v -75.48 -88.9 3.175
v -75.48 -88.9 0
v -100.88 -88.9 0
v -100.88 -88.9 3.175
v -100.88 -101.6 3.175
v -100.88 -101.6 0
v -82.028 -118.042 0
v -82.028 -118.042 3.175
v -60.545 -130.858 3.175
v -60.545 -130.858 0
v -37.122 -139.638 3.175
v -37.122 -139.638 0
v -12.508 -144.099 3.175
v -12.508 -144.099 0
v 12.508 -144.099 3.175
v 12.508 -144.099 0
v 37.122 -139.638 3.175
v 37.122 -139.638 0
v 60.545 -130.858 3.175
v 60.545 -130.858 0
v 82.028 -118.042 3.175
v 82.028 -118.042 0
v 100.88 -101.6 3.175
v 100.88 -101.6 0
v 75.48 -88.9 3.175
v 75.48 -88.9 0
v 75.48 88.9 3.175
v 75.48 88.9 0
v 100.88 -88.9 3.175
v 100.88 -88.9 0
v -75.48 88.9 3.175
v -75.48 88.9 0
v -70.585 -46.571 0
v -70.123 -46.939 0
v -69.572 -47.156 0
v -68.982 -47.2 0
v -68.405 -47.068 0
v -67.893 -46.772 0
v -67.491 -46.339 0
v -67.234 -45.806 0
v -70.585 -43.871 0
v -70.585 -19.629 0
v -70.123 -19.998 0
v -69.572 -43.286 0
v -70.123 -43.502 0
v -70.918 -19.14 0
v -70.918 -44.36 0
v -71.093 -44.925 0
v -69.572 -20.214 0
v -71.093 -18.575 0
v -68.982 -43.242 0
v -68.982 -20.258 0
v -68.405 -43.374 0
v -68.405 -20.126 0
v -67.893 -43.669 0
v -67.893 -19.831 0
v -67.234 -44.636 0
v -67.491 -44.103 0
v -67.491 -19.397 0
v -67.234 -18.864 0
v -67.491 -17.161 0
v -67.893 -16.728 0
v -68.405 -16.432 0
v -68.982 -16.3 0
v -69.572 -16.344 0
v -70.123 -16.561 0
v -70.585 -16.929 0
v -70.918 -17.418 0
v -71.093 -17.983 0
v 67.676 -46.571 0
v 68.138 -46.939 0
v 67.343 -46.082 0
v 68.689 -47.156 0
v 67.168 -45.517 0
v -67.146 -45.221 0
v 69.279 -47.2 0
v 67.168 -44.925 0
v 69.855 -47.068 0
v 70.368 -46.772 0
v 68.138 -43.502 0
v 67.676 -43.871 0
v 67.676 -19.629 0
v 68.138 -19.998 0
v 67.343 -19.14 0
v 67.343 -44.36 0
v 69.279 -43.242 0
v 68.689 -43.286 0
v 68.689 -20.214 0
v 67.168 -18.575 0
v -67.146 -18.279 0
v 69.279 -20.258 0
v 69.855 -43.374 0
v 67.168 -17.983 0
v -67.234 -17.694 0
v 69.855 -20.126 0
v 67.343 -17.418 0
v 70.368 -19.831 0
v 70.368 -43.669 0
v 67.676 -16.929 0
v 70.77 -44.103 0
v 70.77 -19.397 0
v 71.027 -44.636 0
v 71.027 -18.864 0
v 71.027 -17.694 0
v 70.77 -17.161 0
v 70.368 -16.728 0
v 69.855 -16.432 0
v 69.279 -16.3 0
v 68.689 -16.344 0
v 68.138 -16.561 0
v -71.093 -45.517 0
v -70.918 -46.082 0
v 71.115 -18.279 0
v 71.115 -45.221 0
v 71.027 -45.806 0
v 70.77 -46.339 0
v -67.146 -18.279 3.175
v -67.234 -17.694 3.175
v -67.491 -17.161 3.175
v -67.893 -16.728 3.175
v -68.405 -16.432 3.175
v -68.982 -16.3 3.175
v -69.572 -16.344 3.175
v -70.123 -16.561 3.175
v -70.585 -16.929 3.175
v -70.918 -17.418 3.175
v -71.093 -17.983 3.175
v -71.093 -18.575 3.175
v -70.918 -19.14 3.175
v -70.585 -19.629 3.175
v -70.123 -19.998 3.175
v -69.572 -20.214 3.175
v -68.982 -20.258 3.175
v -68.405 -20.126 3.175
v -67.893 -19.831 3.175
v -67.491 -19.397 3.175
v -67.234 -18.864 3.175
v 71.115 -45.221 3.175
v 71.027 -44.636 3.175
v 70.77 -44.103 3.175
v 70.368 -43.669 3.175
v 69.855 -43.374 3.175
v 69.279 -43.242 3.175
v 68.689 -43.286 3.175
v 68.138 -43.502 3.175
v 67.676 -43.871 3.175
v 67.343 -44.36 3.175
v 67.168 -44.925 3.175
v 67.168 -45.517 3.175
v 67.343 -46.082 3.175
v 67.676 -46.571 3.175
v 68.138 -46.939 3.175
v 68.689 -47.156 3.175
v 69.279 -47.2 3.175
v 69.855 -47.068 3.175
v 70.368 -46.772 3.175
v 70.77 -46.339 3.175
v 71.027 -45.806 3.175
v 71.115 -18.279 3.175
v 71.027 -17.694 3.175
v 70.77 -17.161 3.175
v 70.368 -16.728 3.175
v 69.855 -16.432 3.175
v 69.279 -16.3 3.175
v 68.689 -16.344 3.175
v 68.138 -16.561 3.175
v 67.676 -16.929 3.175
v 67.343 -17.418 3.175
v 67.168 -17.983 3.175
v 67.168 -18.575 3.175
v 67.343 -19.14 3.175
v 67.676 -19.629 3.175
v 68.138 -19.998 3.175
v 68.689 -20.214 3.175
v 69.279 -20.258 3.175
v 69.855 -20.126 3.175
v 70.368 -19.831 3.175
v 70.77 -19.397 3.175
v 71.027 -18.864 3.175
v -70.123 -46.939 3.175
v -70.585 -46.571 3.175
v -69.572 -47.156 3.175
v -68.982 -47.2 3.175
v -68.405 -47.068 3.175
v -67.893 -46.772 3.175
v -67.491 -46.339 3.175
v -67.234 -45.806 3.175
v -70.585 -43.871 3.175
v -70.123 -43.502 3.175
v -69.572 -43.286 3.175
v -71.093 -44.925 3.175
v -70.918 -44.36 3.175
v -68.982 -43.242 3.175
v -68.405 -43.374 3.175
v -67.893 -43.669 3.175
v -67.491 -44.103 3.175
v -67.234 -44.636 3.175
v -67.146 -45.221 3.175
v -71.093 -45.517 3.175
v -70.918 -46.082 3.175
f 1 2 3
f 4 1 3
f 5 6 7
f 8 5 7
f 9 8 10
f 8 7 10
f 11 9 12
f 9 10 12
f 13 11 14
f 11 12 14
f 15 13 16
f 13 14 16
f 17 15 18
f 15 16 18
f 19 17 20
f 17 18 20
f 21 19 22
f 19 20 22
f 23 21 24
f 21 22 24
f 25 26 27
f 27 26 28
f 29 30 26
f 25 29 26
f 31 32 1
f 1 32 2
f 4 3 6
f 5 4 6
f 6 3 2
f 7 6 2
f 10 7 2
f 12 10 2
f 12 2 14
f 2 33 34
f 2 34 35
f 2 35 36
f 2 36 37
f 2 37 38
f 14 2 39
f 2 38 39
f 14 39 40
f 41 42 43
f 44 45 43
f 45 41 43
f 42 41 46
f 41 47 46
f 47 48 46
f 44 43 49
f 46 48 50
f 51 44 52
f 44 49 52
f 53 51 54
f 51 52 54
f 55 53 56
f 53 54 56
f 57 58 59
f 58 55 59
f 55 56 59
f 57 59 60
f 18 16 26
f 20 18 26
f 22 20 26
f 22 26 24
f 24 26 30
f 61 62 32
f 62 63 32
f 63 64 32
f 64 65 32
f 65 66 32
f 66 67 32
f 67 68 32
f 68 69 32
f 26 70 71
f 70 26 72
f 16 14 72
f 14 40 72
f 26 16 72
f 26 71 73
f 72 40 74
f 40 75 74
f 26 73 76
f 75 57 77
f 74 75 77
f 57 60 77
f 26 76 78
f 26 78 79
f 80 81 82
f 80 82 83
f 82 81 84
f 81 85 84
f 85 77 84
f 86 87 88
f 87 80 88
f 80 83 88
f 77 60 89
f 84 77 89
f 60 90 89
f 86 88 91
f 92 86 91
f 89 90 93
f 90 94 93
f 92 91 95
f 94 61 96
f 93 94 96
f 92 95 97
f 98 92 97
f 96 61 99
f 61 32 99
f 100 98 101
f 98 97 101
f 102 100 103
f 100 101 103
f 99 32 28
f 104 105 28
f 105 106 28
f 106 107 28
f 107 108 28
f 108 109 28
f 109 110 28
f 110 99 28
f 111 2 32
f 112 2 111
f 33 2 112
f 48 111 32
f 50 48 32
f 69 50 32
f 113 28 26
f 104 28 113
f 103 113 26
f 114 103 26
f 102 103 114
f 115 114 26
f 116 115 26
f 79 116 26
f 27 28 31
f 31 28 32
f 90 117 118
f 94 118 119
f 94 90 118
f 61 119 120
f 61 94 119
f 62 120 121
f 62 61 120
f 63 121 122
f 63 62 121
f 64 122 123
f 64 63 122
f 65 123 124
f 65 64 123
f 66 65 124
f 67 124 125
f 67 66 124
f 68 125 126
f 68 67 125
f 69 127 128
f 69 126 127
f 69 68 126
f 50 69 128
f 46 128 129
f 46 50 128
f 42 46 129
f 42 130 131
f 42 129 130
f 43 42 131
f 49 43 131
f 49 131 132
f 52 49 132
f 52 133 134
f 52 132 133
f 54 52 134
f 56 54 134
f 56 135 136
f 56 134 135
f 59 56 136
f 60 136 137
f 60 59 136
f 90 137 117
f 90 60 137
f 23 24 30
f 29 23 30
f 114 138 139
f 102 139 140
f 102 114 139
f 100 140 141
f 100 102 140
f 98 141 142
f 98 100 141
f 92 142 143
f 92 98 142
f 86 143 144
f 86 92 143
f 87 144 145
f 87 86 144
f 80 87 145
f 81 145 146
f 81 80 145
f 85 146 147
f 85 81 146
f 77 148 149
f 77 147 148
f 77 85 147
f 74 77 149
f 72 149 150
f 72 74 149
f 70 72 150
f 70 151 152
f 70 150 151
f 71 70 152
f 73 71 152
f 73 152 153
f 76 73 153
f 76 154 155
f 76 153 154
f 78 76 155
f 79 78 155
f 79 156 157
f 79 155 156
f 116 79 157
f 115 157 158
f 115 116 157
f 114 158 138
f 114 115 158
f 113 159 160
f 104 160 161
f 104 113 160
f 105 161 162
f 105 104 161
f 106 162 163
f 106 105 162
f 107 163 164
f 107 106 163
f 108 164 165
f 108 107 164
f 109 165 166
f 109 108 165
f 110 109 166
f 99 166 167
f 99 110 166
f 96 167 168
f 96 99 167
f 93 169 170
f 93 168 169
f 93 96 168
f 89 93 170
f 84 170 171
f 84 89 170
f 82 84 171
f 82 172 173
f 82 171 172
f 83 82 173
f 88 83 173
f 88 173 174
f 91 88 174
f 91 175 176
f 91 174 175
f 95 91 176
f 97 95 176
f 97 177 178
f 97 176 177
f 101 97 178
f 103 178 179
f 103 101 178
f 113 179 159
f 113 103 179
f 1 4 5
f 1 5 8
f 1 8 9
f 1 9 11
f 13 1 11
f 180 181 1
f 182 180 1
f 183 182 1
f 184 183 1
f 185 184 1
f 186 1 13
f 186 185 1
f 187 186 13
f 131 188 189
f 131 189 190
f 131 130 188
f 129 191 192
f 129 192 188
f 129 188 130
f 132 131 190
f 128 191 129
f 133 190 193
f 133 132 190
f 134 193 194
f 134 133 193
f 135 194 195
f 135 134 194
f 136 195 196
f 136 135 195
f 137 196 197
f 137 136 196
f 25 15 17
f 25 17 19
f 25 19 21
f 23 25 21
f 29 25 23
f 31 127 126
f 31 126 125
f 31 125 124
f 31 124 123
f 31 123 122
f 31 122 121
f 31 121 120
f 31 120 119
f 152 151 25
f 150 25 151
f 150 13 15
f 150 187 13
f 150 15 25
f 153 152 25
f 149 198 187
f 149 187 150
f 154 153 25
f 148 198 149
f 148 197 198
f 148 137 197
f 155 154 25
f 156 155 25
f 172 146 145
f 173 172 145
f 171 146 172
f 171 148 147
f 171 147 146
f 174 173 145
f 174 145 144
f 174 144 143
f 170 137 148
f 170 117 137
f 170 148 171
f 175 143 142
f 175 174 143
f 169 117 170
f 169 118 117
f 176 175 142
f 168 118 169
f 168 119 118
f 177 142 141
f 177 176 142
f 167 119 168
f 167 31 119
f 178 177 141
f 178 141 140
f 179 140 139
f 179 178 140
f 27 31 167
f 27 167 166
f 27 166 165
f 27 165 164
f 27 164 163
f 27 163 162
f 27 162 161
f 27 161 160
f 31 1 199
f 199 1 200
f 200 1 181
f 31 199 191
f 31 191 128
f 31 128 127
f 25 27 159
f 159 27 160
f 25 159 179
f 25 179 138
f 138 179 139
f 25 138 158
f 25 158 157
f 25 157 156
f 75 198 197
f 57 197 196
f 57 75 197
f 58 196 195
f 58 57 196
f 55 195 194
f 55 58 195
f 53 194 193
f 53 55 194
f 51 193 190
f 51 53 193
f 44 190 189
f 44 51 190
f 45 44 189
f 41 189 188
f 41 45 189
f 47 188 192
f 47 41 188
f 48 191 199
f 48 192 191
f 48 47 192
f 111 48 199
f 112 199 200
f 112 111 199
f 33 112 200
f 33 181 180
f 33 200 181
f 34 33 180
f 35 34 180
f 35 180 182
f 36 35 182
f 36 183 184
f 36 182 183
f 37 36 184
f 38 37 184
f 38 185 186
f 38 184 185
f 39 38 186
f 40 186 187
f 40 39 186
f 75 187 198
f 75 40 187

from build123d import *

# Parameters (mm, degrees)
F1_DEPTH = 3.175
F2_R     = 1.984375
F3_DEPTH = 3.176


with BuildPart() as f1:
    # F0 (on Top) → F1 (new body)
    with BuildSketch(Plane.XY):
        with BuildLine():
            Line((75.480408, 88.9), (-75.480408, 88.9))
            Line((-75.480408, 88.9), (-75.480408, -88.9))
            Line((-75.480408, -88.9), (-100.880408, -88.9))
            Line((-100.880408, -88.9), (-100.880408, -101.6))
            ThreePointArc((-100.880408, -101.6), (0, -144.660291), (100.880408, -101.6))
            Line((100.880408, -101.6), (100.880408, -88.9))
            Line((100.880408, -88.9), (75.480408, -88.9))
            Line((75.480408, -88.9), (75.480408, 88.9))
        make_face()
    extrude(amount=F1_DEPTH)

    # F2 (on Top) → F3 (cut, through all)
    with BuildSketch(Plane.XY):
        with Locations((69.130408, -45.22089)):
            Circle(F2_R)
        with Locations((69.130408, -18.27911)):
            Circle(F2_R)
        with Locations((-69.130408, -45.22089)):
            Circle(F2_R)
        with Locations((-69.130408, -18.27911)):
            Circle(F2_R)
    extrude(amount=F3_DEPTH, mode=Mode.SUBTRACT)


solid = f1.part
